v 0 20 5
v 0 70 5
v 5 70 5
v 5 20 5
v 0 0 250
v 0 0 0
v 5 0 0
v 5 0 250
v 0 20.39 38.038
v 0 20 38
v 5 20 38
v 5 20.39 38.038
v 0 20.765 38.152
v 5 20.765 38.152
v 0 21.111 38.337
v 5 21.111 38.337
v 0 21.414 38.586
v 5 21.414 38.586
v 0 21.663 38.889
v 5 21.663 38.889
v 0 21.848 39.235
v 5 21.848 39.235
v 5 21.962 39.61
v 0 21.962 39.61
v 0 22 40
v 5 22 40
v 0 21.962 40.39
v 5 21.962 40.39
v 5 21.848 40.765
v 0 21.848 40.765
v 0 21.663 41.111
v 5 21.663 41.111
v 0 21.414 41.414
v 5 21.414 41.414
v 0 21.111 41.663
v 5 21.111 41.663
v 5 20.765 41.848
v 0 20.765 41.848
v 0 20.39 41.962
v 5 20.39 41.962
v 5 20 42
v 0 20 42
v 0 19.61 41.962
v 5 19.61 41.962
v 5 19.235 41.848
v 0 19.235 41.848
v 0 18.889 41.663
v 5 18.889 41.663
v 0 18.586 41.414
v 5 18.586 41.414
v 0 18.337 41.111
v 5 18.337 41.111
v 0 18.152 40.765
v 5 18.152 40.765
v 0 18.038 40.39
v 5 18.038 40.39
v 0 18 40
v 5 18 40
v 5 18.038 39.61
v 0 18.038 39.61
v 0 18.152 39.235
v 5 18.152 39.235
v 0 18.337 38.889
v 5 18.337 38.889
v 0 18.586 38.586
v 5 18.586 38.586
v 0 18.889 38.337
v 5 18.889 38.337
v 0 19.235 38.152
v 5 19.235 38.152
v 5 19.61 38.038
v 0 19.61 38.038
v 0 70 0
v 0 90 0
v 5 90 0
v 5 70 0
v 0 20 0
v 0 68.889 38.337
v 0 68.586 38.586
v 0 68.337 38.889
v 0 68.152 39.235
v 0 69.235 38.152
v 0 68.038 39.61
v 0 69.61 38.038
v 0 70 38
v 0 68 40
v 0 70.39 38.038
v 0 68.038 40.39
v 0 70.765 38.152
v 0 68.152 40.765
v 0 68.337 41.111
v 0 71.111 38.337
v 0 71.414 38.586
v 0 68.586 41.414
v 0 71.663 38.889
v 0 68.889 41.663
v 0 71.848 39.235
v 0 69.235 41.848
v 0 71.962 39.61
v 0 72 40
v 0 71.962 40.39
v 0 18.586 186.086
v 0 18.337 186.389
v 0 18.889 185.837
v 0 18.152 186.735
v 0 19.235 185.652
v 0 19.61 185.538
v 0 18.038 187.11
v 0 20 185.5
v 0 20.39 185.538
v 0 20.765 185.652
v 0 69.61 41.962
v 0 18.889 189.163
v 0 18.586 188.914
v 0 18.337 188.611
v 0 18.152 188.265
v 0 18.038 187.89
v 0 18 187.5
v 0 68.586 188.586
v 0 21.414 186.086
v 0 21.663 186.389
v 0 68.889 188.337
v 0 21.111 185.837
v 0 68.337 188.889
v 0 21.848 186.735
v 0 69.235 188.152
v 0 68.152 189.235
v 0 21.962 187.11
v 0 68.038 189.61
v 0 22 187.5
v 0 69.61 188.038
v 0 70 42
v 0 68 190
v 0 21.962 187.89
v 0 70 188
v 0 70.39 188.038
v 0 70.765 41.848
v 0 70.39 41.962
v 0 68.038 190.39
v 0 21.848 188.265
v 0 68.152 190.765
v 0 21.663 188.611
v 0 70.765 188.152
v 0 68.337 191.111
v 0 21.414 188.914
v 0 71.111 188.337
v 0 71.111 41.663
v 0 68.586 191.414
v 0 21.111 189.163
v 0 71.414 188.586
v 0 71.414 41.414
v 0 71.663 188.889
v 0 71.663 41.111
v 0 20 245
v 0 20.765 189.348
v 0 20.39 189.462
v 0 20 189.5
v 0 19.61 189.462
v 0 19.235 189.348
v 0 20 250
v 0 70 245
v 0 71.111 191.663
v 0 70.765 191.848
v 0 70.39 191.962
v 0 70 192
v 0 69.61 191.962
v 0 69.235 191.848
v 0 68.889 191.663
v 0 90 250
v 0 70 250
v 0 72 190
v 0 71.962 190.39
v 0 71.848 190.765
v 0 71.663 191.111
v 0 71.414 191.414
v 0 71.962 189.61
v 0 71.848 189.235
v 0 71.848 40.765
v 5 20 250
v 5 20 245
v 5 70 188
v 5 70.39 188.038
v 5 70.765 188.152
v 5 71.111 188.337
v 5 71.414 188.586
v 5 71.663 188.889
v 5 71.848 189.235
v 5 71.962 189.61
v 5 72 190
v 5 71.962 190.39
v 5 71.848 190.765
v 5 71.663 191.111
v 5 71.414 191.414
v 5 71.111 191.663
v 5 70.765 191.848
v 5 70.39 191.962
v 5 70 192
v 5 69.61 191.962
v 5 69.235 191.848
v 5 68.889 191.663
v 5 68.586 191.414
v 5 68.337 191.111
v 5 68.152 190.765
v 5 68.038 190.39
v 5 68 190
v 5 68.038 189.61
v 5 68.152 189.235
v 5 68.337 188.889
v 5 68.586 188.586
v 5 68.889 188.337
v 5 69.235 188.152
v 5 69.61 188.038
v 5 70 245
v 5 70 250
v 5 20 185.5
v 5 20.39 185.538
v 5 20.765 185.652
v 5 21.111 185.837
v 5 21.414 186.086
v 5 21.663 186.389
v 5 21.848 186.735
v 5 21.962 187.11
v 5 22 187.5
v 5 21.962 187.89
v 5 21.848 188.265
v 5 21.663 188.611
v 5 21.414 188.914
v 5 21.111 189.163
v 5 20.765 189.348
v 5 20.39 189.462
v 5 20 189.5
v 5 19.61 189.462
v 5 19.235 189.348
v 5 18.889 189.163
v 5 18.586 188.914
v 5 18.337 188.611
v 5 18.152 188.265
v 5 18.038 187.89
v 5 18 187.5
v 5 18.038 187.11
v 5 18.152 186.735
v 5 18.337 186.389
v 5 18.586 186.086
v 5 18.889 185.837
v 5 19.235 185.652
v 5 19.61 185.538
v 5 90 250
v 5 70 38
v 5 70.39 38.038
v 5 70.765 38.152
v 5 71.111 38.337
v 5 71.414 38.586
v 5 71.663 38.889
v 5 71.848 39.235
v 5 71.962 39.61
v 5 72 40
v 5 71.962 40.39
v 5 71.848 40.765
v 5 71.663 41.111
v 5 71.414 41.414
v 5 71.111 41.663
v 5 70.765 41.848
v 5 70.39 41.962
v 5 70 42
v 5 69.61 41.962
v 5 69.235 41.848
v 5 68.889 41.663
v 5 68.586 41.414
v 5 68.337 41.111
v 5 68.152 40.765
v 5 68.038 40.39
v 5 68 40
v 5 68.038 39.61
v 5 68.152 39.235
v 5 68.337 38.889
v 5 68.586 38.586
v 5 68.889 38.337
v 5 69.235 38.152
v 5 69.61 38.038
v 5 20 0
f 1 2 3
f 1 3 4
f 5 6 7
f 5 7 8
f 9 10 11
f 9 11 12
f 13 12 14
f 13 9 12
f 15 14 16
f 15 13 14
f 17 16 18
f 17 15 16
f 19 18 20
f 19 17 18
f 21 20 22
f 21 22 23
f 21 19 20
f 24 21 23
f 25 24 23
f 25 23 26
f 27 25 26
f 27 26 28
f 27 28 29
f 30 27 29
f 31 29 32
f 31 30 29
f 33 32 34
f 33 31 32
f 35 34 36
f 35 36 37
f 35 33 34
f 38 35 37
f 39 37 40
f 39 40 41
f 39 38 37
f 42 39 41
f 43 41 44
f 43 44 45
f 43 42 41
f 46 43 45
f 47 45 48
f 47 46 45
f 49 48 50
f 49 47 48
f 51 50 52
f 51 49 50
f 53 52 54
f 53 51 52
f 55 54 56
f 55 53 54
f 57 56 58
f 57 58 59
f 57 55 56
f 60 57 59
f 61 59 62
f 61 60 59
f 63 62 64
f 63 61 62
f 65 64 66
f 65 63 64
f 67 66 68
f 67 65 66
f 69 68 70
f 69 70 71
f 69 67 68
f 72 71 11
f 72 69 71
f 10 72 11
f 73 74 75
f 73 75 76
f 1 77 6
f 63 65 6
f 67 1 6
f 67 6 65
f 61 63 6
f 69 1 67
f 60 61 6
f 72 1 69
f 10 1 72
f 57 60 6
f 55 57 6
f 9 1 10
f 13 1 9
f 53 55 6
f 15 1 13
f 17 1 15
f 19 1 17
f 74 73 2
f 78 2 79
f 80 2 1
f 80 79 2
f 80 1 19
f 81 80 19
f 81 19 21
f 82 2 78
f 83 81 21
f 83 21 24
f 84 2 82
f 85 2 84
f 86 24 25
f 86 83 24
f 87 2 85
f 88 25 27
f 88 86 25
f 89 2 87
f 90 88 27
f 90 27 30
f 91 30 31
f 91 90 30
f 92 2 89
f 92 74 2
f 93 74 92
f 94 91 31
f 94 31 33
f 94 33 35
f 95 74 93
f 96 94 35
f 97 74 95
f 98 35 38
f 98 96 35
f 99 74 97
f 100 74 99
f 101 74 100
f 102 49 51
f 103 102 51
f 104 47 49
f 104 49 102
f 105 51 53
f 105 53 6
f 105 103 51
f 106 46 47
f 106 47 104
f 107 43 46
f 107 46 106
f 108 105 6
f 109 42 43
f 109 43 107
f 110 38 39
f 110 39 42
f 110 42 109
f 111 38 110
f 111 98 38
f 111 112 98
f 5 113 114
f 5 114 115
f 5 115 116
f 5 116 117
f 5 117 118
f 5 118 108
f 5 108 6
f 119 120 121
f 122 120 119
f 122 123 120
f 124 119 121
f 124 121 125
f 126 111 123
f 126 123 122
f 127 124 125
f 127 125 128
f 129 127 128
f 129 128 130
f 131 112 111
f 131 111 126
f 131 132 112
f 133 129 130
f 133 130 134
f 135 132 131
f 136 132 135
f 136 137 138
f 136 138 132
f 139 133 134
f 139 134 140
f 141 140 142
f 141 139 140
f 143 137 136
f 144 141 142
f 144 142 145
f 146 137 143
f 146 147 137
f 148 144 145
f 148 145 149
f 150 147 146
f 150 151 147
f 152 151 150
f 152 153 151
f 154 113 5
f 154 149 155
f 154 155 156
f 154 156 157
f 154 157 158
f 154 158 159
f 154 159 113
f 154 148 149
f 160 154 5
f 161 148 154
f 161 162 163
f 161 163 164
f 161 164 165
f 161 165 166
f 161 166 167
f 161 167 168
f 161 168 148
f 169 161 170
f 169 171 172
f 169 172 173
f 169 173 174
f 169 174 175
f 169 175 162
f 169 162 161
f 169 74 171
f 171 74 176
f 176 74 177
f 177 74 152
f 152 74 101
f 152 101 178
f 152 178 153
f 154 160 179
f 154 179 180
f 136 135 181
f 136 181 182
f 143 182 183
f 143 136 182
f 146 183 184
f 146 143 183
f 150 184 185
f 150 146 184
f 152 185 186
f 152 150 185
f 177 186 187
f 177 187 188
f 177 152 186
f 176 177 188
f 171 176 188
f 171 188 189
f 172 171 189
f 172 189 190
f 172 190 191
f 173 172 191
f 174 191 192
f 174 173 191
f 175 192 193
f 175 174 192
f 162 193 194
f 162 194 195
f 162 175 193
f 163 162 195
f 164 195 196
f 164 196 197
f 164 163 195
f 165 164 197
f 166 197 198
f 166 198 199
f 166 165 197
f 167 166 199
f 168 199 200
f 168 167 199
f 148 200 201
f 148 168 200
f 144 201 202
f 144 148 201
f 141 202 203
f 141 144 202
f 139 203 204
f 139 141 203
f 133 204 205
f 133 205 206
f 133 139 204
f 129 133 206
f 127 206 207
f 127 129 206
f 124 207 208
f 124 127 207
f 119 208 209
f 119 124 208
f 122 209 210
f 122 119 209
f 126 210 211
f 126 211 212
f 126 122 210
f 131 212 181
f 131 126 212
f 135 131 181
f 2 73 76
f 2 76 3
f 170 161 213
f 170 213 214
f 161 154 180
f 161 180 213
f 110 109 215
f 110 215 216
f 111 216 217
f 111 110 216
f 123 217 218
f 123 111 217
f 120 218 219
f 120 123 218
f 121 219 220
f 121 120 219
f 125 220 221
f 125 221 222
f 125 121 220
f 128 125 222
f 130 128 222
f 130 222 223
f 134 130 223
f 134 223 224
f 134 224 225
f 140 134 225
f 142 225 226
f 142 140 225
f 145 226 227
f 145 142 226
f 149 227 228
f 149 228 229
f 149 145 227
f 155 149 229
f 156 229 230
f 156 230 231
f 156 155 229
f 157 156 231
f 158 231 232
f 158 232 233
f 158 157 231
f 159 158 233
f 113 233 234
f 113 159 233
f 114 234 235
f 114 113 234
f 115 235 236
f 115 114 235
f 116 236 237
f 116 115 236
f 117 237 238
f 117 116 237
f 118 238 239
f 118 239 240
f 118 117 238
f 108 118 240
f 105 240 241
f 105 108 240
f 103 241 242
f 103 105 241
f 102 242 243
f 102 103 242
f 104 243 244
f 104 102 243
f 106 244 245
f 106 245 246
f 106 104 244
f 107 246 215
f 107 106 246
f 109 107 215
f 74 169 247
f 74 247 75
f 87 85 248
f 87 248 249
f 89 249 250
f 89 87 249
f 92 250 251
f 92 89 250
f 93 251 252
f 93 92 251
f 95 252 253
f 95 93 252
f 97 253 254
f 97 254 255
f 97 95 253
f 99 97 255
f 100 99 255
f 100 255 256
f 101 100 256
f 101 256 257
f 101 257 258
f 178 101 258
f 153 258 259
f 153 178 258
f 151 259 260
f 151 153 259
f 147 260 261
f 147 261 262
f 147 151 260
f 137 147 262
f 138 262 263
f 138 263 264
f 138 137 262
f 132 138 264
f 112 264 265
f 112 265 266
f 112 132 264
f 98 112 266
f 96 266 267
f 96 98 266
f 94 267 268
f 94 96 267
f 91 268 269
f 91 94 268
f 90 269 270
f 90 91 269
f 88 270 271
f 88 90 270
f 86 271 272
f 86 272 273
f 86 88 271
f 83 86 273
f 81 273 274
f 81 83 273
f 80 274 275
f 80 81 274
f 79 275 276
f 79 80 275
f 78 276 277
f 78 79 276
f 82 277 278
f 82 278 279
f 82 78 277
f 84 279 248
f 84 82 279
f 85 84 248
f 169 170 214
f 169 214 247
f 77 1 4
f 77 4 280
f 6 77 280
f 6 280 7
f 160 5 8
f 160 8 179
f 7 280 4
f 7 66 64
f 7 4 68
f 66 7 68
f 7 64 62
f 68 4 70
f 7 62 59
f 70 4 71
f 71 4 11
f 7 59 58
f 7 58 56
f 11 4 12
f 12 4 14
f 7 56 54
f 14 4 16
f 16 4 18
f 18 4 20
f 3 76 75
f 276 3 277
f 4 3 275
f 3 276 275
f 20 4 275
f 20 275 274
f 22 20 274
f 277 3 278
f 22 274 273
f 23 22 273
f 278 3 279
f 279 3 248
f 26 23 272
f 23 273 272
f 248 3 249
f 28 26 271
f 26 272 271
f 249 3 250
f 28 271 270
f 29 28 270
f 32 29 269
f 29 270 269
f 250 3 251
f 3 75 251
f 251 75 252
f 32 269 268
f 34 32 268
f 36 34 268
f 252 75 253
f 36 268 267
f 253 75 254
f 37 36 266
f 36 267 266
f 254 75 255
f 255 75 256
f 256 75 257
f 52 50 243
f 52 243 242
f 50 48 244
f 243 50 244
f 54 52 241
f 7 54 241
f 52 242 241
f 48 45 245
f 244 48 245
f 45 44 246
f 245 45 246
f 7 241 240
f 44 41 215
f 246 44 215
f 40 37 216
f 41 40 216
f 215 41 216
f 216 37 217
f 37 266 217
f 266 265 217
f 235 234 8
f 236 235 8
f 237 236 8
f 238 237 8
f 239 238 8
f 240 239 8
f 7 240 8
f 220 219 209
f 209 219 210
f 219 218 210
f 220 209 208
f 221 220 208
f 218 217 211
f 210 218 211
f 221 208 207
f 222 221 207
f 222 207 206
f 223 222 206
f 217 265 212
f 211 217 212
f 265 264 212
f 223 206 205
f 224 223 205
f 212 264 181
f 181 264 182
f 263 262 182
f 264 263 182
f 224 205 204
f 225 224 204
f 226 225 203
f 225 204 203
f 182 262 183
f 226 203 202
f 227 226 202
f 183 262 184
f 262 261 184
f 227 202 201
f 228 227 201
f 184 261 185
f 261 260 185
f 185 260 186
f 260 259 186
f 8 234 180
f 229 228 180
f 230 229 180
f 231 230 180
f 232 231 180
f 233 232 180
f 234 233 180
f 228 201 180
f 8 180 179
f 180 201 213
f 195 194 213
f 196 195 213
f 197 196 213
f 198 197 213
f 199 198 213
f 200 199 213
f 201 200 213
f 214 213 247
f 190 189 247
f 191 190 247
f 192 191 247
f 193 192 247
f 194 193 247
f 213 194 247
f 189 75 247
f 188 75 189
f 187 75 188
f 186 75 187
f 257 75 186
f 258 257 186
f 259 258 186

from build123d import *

# Parameters (mm, degrees)
SKETCH_1_R      = 2
EXTRUDE_1_DEPTH = 5


with BuildPart() as part:
    # 草图1 → 凸台-拉伸1 (new body)
    with BuildSketch(Plane(origin=(0, 0, 0), x_dir=(0, 0, -1), z_dir=(1, 0, 0))):
        Polygon((0, 0), (-250, 0), (-250, 20), (-245, 20), (-245, 70), (-250, 70), (-250, 90), (0, 90), (0, 70), (-5, 70), (-5, 20), (0, 20), align=None)
        with Locations((-40, 70)):
            Circle(SKETCH_1_R, mode=Mode.SUBTRACT)
        with Locations((-40, 20)):
            Circle(SKETCH_1_R, mode=Mode.SUBTRACT)
        with Locations((-187.5, 20)):
            Circle(SKETCH_1_R, mode=Mode.SUBTRACT)
        with Locations((-190, 70)):
            Circle(SKETCH_1_R, mode=Mode.SUBTRACT)
    extrude(amount=EXTRUDE_1_DEPTH)


solid = part.part
